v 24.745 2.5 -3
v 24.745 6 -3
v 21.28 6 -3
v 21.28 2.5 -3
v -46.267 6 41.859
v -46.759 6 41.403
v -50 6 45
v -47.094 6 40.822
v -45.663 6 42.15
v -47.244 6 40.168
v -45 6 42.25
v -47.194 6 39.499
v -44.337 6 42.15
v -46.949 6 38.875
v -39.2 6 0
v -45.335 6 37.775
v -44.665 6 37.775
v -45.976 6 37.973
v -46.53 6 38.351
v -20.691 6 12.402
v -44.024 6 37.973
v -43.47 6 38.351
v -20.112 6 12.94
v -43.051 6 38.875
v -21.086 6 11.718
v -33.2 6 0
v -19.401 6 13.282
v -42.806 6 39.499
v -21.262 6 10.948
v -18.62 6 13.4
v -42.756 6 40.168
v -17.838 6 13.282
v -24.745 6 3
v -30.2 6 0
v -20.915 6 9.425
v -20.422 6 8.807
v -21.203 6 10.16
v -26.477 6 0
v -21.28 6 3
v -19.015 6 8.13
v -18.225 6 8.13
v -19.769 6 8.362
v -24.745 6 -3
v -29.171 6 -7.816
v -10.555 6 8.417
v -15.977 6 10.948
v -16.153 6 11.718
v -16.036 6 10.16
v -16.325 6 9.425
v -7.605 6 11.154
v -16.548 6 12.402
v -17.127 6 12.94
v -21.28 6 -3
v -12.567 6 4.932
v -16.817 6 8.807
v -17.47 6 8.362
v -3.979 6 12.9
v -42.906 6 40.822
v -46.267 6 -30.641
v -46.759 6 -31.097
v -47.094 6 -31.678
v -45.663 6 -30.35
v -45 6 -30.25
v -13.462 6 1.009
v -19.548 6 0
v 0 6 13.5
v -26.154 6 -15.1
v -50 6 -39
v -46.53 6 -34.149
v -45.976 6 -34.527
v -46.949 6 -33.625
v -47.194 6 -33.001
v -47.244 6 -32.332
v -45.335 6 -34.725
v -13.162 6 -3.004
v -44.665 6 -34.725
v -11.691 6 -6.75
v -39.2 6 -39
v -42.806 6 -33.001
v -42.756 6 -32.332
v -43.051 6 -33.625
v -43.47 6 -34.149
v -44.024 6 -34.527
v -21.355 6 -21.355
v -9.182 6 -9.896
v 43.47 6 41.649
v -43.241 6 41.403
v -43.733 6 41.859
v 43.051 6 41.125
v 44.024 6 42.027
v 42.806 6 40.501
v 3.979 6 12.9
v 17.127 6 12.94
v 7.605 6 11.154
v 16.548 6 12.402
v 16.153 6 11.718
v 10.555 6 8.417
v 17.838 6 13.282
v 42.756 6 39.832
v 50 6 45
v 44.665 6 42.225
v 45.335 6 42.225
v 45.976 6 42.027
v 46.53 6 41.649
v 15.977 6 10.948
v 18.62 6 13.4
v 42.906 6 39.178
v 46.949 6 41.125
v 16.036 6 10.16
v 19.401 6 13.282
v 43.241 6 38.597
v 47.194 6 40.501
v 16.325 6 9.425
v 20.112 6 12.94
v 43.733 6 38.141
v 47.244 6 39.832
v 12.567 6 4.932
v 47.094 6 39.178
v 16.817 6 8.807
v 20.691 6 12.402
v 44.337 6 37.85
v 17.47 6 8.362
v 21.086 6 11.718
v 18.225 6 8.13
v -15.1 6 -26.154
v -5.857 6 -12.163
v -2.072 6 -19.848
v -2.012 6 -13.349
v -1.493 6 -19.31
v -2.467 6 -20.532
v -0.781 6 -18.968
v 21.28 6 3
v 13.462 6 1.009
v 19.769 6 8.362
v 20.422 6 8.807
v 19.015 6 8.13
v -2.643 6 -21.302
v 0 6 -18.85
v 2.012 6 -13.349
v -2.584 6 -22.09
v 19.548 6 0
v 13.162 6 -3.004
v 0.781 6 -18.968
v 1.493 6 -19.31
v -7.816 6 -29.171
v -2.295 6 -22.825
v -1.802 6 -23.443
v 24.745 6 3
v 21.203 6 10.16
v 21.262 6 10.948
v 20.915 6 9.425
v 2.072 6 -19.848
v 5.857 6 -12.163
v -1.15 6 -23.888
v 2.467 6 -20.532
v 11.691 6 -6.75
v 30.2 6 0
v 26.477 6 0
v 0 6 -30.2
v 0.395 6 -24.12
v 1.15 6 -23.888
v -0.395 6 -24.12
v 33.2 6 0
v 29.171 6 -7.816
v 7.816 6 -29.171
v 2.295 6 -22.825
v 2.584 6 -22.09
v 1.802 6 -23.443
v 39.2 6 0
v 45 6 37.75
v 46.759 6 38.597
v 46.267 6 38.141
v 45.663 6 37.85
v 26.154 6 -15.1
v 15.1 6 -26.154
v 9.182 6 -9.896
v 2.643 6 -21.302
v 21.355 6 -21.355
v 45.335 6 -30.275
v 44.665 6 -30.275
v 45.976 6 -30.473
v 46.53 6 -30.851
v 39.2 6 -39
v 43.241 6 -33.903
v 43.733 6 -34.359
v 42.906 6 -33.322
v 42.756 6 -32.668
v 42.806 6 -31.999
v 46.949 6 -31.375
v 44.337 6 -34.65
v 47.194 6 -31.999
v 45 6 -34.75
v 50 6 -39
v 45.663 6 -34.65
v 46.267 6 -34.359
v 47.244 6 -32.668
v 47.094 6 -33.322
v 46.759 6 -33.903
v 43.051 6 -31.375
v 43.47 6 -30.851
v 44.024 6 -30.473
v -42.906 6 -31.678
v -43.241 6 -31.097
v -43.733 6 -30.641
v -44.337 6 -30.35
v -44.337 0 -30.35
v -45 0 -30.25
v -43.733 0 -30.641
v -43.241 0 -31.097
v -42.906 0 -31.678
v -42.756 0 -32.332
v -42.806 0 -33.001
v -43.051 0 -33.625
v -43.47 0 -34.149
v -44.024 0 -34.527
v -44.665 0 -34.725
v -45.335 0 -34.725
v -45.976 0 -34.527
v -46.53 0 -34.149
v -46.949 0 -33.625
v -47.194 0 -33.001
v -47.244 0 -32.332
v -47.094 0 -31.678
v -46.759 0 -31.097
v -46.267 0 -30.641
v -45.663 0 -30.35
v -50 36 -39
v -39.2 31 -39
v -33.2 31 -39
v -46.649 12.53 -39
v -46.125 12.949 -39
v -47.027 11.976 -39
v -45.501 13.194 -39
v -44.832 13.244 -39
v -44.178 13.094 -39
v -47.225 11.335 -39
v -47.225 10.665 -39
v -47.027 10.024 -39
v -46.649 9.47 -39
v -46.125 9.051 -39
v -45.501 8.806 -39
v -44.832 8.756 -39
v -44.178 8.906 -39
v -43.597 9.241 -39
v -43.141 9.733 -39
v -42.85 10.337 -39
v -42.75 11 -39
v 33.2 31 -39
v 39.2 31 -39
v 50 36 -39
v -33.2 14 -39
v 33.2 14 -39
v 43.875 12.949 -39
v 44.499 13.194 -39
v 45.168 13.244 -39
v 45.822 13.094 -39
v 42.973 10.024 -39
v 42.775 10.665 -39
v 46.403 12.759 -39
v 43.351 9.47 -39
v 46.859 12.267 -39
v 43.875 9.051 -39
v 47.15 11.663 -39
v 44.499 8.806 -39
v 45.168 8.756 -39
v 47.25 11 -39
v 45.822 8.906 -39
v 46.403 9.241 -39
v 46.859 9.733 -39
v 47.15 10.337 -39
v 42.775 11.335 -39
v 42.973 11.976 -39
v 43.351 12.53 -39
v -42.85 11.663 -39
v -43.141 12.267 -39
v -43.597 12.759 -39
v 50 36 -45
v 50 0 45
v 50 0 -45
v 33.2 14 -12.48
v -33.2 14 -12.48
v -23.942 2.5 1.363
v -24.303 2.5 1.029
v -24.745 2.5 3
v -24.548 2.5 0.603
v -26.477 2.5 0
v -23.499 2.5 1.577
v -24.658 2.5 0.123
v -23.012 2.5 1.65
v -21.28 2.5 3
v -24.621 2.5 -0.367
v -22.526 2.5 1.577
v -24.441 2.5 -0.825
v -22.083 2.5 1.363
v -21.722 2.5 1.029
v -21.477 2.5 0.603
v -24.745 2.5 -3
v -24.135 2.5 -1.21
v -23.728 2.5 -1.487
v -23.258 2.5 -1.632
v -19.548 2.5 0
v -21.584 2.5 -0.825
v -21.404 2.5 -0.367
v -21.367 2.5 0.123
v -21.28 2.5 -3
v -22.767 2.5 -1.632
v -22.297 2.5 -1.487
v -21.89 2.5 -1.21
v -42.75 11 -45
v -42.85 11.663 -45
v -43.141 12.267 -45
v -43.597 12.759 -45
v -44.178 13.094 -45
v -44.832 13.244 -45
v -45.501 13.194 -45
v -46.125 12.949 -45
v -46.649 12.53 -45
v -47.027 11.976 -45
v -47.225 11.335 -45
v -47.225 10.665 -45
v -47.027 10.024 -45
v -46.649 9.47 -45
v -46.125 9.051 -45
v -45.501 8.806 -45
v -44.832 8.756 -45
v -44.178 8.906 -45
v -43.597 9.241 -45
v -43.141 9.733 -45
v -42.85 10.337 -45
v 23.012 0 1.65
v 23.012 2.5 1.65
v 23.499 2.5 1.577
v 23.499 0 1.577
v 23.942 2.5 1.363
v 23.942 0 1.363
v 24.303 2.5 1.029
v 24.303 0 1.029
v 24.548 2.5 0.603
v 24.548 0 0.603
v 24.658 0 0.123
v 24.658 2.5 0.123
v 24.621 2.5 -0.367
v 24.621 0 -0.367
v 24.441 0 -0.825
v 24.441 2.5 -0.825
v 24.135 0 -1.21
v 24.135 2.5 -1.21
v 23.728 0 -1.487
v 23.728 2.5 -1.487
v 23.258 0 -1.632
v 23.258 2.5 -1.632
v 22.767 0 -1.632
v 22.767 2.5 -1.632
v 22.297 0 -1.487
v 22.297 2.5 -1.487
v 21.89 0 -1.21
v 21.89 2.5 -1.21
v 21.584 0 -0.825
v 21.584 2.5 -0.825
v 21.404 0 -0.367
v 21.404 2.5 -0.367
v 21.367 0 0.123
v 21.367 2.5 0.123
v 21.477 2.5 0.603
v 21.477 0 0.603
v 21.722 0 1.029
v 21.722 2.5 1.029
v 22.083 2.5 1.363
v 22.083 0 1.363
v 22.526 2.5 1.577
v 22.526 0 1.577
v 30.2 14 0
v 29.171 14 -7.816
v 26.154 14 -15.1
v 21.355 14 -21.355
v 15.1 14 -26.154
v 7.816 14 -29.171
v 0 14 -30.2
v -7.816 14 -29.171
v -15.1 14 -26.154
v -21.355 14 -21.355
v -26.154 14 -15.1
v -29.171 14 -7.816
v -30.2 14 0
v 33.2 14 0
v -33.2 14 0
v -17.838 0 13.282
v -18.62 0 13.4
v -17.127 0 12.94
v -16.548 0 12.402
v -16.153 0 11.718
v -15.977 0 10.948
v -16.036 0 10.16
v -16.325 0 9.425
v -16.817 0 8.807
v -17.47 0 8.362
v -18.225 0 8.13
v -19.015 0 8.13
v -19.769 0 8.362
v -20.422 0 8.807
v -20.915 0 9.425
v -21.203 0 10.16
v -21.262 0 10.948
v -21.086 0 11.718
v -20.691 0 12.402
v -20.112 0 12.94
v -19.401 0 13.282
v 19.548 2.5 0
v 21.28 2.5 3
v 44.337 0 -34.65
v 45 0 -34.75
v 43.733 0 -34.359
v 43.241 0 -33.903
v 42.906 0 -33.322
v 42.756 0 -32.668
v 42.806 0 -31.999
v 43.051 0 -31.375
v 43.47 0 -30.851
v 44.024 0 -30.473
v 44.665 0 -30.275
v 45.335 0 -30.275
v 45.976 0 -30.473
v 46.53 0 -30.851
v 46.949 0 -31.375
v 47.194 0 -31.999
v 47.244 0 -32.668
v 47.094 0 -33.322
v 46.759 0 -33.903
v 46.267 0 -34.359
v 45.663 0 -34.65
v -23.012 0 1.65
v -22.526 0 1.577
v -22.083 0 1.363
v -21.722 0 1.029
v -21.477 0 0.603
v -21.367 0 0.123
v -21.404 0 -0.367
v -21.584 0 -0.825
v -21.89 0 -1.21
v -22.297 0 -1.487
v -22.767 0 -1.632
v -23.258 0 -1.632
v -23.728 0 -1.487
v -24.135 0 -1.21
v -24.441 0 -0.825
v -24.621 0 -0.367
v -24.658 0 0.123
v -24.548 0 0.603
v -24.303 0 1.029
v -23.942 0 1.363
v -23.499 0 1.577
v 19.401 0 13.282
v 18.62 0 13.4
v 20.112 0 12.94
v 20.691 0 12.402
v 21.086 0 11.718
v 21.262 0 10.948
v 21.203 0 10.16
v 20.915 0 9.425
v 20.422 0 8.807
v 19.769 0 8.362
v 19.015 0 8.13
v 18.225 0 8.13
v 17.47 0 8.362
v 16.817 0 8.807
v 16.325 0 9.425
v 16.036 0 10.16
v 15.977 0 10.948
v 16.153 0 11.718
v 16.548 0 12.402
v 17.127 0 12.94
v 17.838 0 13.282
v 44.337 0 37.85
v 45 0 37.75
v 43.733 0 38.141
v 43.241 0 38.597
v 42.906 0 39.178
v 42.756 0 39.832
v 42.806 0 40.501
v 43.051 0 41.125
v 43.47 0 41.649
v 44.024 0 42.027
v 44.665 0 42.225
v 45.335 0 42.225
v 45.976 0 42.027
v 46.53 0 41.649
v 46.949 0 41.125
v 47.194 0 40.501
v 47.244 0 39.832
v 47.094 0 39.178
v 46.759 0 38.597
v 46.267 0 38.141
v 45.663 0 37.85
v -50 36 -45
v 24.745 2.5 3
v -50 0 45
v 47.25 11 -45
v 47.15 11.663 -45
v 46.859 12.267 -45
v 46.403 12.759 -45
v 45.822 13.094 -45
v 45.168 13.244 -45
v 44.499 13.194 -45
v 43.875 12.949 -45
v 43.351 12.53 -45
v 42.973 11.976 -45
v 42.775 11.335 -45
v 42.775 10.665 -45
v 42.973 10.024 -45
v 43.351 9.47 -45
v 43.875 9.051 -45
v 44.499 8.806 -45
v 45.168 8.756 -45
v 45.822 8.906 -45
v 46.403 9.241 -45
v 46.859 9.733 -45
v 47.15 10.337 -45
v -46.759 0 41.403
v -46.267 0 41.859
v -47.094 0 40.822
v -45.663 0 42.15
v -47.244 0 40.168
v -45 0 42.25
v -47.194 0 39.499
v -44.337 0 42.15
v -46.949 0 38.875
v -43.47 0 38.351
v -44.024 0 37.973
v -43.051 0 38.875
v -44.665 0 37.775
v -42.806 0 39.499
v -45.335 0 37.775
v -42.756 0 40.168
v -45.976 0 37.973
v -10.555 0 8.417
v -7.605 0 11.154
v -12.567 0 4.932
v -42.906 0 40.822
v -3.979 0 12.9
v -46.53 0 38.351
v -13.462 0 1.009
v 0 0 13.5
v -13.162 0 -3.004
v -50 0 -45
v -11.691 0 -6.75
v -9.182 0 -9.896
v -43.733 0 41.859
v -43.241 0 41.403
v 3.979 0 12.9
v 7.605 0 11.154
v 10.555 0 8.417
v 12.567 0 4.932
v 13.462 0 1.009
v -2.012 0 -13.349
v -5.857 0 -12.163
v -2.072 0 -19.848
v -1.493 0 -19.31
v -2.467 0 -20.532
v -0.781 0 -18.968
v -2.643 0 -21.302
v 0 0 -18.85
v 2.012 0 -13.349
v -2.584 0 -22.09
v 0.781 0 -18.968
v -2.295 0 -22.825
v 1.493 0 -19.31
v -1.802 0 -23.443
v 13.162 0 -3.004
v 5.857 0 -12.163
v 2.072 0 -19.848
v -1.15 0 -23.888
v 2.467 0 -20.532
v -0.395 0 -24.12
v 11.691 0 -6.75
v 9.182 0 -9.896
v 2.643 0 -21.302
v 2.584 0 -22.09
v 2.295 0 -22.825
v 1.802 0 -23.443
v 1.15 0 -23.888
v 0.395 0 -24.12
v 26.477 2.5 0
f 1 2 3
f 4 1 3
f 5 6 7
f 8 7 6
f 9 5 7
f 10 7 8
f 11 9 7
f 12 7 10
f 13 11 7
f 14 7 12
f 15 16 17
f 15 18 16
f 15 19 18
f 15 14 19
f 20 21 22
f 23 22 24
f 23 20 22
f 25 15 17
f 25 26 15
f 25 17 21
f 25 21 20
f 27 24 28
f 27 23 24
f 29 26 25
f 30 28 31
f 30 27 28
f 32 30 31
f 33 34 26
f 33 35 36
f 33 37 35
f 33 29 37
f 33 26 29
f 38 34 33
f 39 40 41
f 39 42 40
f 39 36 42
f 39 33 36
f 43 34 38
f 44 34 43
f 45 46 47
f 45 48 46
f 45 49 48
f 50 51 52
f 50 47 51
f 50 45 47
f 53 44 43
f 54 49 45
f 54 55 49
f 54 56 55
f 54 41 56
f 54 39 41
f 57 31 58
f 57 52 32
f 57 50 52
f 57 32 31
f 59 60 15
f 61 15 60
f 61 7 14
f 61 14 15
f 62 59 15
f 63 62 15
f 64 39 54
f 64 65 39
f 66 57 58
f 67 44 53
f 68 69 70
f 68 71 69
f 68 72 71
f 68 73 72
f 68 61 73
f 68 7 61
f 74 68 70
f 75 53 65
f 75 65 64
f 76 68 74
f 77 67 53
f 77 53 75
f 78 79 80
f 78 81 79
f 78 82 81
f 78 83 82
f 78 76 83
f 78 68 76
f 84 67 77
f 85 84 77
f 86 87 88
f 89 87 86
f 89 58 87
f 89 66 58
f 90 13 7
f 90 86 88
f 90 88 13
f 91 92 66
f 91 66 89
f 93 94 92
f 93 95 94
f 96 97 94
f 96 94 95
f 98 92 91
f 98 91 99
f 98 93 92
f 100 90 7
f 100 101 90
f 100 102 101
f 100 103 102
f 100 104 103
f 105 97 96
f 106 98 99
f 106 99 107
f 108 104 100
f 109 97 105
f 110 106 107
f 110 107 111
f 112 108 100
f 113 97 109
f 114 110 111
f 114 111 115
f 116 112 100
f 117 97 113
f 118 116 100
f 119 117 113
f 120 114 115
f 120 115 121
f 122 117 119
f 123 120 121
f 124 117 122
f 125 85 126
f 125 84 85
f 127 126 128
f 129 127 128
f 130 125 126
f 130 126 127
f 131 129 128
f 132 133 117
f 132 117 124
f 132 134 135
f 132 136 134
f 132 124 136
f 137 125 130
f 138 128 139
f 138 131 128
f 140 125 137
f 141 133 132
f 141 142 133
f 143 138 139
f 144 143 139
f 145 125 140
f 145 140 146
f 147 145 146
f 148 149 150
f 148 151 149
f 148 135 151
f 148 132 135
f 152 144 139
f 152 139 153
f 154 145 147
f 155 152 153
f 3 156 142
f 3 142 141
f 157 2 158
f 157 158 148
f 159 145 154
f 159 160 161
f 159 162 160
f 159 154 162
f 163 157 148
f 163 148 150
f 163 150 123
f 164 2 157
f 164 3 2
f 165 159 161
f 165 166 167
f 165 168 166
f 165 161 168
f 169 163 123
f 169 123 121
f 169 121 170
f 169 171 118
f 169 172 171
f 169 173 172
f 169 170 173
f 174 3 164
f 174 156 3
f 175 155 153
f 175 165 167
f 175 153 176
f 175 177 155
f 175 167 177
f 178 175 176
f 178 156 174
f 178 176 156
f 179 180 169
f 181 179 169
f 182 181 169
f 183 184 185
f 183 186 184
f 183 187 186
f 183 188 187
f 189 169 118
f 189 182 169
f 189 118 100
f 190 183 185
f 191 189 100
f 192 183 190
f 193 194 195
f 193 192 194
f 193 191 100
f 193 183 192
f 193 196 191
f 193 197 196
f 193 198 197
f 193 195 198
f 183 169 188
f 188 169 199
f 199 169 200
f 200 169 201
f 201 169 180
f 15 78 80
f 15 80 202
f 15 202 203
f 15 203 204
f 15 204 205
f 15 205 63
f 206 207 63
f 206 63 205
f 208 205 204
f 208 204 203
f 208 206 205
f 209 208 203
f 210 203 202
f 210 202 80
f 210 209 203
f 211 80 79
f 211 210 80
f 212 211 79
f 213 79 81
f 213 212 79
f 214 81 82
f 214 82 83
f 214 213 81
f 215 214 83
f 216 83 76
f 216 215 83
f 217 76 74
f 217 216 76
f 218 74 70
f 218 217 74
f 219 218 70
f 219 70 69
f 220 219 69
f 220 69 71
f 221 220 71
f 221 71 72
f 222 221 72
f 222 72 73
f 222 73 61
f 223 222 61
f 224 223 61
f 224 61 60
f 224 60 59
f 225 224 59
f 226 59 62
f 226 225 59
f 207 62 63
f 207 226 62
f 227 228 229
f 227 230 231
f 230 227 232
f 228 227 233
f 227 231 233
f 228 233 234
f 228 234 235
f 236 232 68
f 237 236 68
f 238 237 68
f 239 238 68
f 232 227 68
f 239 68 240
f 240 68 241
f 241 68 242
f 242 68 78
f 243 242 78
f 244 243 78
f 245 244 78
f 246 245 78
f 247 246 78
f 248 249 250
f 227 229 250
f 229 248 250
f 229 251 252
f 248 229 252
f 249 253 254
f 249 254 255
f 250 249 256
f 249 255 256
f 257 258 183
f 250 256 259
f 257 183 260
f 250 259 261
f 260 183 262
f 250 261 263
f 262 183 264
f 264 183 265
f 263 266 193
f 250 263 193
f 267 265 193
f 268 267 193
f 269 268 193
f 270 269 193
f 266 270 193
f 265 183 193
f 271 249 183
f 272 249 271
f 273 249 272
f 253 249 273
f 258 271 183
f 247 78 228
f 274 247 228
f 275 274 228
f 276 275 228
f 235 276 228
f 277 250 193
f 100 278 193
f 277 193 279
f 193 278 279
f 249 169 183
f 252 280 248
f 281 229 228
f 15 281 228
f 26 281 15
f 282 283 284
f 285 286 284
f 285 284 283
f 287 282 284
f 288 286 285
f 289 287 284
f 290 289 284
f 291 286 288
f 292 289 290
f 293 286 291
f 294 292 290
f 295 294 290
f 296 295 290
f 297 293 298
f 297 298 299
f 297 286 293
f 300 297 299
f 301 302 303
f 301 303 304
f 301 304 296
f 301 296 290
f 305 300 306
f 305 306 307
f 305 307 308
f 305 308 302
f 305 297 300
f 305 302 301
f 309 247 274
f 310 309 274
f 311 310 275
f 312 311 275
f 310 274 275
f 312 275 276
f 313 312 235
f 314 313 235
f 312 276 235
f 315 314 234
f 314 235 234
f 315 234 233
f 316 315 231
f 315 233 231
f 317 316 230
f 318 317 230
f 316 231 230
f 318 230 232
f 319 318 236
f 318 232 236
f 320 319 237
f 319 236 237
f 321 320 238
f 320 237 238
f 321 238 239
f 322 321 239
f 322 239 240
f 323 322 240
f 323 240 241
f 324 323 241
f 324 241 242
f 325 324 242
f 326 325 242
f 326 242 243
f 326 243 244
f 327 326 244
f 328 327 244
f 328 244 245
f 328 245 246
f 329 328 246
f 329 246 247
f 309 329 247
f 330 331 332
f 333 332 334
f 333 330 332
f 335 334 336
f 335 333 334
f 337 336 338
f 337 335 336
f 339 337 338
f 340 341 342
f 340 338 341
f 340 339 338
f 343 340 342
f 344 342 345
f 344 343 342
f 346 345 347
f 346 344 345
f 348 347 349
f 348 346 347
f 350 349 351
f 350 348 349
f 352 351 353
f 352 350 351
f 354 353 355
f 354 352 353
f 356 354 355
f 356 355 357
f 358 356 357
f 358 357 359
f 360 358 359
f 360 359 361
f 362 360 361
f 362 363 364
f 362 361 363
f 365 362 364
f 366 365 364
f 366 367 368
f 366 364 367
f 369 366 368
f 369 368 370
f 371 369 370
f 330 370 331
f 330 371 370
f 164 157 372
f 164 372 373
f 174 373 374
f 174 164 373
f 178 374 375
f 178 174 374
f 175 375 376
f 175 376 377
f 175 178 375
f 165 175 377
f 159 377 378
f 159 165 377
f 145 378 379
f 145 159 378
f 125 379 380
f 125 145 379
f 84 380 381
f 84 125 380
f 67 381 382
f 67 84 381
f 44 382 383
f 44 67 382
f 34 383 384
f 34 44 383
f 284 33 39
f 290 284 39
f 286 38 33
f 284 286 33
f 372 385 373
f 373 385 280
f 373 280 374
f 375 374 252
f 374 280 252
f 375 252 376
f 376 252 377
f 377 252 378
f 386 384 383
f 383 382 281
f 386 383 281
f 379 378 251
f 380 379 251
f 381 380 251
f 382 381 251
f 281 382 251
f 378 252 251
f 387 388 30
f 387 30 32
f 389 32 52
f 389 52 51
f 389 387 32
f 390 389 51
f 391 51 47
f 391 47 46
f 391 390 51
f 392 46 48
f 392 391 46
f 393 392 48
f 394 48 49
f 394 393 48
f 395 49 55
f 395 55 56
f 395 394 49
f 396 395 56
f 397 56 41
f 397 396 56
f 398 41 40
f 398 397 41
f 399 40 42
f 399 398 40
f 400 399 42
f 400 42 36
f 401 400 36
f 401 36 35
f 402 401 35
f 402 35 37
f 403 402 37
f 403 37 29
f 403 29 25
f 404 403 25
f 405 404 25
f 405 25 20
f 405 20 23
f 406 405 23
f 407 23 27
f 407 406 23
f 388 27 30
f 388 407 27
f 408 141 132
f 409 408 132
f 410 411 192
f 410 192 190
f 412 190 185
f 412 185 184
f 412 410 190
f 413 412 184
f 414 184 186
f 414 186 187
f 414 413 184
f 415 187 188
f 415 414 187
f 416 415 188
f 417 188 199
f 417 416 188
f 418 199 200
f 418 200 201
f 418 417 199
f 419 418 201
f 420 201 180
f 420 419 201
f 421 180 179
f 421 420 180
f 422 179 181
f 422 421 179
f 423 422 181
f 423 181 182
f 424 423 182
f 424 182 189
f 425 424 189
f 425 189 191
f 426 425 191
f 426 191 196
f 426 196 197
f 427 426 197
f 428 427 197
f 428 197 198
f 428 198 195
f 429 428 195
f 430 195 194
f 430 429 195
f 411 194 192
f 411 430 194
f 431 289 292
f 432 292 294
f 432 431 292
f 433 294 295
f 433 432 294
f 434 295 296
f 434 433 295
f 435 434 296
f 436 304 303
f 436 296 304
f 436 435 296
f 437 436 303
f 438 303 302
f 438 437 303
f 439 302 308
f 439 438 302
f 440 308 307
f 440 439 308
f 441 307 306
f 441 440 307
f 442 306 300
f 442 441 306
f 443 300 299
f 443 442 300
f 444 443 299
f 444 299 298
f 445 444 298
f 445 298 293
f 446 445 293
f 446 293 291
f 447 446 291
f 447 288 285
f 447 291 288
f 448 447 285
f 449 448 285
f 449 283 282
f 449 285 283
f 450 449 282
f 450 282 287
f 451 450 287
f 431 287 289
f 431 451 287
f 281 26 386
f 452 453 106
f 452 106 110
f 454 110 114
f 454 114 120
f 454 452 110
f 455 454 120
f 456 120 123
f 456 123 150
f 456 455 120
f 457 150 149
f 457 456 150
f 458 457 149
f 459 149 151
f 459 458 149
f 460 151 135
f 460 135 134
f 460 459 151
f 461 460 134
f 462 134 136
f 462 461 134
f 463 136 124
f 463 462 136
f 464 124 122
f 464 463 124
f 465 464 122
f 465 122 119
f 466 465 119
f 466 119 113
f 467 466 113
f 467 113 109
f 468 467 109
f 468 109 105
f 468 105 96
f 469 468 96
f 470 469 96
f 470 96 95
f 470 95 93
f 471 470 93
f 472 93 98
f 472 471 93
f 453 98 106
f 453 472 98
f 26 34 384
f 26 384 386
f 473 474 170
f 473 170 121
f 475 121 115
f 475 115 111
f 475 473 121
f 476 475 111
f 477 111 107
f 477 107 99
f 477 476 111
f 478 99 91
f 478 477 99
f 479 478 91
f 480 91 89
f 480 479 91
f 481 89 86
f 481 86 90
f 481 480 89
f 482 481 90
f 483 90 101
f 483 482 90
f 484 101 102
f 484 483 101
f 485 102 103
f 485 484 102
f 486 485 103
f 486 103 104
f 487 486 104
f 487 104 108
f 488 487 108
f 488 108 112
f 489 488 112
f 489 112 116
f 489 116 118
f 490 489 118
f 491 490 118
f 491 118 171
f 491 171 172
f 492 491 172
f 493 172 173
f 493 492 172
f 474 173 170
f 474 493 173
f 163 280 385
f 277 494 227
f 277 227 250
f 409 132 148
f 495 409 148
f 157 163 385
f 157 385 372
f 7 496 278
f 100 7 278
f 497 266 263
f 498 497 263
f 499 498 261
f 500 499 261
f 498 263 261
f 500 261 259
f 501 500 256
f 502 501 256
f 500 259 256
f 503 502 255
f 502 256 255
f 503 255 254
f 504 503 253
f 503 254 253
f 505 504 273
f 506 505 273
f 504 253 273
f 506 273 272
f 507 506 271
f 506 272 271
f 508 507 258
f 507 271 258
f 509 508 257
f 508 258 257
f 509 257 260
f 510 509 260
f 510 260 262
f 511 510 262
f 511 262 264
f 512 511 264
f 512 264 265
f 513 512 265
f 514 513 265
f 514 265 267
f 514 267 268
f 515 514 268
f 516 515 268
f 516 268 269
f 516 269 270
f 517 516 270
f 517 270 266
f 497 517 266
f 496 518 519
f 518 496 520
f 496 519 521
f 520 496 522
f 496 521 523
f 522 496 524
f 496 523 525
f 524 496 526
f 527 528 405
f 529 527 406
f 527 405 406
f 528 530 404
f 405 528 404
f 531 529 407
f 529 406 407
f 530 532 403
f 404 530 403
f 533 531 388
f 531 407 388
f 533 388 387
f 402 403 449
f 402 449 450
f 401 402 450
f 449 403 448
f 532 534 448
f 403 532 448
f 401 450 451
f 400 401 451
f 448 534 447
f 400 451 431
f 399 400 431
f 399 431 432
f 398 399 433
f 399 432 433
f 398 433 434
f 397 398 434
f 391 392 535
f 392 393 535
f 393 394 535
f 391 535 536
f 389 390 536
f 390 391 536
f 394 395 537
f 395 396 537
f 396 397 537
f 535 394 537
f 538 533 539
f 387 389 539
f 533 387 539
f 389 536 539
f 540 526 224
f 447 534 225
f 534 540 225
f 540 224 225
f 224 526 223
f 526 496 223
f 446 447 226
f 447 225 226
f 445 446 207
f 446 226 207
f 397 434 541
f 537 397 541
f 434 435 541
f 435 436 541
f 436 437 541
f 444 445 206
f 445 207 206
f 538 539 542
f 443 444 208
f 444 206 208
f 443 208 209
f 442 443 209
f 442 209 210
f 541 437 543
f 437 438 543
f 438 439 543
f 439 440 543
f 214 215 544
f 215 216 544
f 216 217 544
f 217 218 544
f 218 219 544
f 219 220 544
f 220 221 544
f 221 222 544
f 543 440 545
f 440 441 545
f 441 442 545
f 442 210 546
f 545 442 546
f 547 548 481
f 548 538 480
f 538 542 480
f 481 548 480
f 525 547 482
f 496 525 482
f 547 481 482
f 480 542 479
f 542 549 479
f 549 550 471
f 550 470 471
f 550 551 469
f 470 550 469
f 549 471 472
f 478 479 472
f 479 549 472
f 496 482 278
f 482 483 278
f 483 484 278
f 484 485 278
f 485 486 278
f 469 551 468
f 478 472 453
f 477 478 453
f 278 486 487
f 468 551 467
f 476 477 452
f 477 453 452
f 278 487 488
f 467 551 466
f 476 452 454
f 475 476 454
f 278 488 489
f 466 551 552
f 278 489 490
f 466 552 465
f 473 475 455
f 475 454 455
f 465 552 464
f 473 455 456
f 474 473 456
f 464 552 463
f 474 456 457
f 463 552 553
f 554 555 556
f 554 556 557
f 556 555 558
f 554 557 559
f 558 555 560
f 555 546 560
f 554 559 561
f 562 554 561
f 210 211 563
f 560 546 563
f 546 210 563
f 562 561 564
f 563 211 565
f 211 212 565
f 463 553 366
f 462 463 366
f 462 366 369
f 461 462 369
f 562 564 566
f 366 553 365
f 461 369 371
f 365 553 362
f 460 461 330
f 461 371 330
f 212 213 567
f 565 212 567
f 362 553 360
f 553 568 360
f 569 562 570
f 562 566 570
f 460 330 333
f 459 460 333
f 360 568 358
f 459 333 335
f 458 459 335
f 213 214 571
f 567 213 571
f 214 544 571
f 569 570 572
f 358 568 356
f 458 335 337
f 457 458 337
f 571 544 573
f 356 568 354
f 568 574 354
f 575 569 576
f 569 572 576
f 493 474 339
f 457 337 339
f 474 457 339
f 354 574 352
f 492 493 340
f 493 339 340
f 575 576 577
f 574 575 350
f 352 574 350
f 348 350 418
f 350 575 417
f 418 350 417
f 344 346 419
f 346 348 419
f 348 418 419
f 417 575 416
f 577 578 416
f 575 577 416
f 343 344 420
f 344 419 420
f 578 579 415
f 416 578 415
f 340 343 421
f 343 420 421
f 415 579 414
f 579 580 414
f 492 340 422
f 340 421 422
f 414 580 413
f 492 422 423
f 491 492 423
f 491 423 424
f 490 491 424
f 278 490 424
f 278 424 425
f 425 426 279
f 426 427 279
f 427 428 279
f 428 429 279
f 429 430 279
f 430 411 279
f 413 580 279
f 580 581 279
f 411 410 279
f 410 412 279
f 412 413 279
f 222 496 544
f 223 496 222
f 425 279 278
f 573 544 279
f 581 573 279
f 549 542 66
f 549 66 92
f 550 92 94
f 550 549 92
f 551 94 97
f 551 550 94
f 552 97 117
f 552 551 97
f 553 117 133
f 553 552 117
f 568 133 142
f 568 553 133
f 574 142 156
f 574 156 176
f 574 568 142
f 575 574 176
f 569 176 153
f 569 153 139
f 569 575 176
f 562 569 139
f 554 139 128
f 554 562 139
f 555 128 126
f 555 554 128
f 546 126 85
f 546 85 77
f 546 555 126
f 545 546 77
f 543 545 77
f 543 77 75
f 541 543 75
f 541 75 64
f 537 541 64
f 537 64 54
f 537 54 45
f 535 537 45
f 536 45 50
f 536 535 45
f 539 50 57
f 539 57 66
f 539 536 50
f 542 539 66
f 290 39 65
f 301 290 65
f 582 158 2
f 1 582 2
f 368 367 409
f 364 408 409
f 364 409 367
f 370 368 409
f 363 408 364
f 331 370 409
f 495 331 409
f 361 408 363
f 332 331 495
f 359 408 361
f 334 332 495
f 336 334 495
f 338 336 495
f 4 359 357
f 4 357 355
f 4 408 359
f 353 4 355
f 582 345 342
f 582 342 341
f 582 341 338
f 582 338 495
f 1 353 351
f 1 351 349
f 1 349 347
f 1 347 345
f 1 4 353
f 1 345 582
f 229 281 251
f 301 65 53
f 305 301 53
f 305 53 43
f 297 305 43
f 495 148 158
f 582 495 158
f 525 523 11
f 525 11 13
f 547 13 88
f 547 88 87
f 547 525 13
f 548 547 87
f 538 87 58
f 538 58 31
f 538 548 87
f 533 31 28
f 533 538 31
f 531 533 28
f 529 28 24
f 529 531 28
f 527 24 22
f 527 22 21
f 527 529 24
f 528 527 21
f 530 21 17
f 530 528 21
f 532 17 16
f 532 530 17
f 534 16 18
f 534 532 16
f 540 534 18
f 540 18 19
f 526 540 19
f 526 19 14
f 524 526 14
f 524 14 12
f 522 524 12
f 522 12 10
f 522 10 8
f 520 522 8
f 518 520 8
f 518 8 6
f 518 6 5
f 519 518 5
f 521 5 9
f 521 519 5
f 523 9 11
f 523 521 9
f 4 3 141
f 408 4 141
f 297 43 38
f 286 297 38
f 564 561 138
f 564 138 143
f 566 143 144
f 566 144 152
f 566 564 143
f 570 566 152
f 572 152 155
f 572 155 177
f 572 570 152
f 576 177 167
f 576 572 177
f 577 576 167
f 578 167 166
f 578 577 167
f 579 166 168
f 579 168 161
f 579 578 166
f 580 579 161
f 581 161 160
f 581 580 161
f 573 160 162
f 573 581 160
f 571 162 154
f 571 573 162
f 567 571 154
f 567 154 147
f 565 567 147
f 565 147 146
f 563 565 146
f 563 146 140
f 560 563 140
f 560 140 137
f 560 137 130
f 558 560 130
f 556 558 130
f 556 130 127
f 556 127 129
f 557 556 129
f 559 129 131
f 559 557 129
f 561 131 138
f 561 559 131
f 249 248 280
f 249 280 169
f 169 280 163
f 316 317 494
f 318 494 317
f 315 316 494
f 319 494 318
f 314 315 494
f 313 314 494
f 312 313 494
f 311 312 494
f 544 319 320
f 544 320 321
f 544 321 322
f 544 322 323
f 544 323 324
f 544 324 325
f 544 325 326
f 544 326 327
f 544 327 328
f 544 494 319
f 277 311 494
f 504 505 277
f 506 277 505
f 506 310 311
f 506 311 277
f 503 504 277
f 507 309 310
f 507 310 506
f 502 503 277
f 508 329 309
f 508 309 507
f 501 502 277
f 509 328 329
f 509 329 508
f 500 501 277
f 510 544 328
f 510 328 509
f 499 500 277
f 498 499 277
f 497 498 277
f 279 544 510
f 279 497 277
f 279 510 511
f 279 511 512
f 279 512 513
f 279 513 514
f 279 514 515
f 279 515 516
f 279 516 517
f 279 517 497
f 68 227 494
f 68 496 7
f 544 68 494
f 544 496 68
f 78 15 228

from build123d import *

# Parameters (mm, degrees)
SKETCH1_W           = 100
SKETCH1_H           = 90
SKETCH1_R           = 13.5
SKETCH1_R_2         = 2.65
SKETCH1_R_3         = 1.65
SKETCH1_R_4         = 2.25
BOSS_EXTRUDE1_DEPTH = 6
BOSS_EXTRUDE2_DEPTH = 8
SKETCH3_W           = 100
SKETCH3_H           = 6
BOSS_EXTRUDE3_DEPTH = 30
CUT_EXTRUDE1_REACH  = 106.173
SKETCH7_R           = 2.25
CUT_EXTRUDE2_DEPTH  = 3.5
BOSS_EXTRUDE4_DEPTH = 6


with BuildPart() as part:
    # Sketch1 → Boss-Extrude1 (new body)
    with BuildSketch(Plane(origin=(0, 0, 0), x_dir=(1, 0, 0), z_dir=(0, 1, 0))):
        Rectangle(SKETCH1_W, SKETCH1_H)
        with Locations(Location((0, 0, 0), (0, 0, 270))):
            Circle(SKETCH1_R, mode=Mode.SUBTRACT)
        with Locations(Location((0, 21.5, 0), (0, 0, 270))):
            Circle(SKETCH1_R_2, mode=Mode.SUBTRACT)
        with Locations(Location((23.0125, 0, 0), (0, 0, 270))):
            Circle(SKETCH1_R_3, mode=Mode.SUBTRACT)
        with Locations(Location((-23.0125, 0, 0), (0, 0, 270))):
            Circle(SKETCH1_R_3, mode=Mode.SUBTRACT)
        with Locations(Location((18.619546181, -10.75, 0), (0, 0, 270))):
            Circle(SKETCH1_R_2, mode=Mode.SUBTRACT)
        with Locations(Location((-18.619546181, -10.75, 0), (0, 0, 270))):
            Circle(SKETCH1_R_2, mode=Mode.SUBTRACT)
        with Locations(Location((-45, -40, 0), (0, 0, 270))):
            Circle(SKETCH1_R_4, mode=Mode.SUBTRACT)
        with Locations(Location((-45, 32.5, 0), (0, 0, 270))):
            Circle(SKETCH1_R_4, mode=Mode.SUBTRACT)
        with Locations(Location((45, 32.5, 0), (0, 0, 90))):
            Circle(SKETCH1_R_4, mode=Mode.SUBTRACT)
        with Locations(Location((45, -40, 0), (0, 0, 90))):
            Circle(SKETCH1_R_4, mode=Mode.SUBTRACT)
    extrude(amount=BOSS_EXTRUDE1_DEPTH)

    # Sketch2 → Boss-Extrude2 (add)
    with BuildSketch(Plane(origin=(0, 6, 0), x_dir=(1, 0, 0), z_dir=(0, 1, 0))):
        with BuildLine():
            Line((-30.2, 0), (-33.2, 0))
            Line((-33.2, 0), (-33.2, 39))
            Line((-33.2, 39), (33.2, 39))
            Line((33.2, 39), (33.2, 0))
            Line((33.2, 0), (30.2, 0))
            ThreePointArc((30.2, 0), (0, 30.2), (-30.2, 0))
        make_face()
    extrude(amount=BOSS_EXTRUDE2_DEPTH)

    # Sketch3 → Boss-Extrude3 (add)
    with BuildSketch(Plane(origin=(0, 6, 0), x_dir=(1, 0, 0), z_dir=(0, 1, 0))):
        with Locations((0, 42)):
            Rectangle(SKETCH3_W, SKETCH3_H)
    extrude(amount=BOSS_EXTRUDE3_DEPTH)

    # Sketch7 → Cut-Extrude1 (cut, up to next)
    with BuildSketch(Plane.XY.offset(-39), mode=Mode.PRIVATE) as cut_extrude1_sk1:
        with Locations((-45, 11)):
            Circle(SKETCH7_R)
    cut_extrude1_tool1 = extrude(cut_extrude1_sk1.sketch, amount=-CUT_EXTRUDE1_REACH, mode=Mode.PRIVATE) & part.part
    # Sketch7 → Cut-Extrude1 (cut, up to next)
    with BuildSketch(Plane.XY.offset(-39), mode=Mode.PRIVATE) as cut_extrude1_sk2:
        with Locations((45, 11)):
            Circle(SKETCH7_R)
    cut_extrude1_tool2 = extrude(cut_extrude1_sk2.sketch, amount=-CUT_EXTRUDE1_REACH, mode=Mode.PRIVATE) & part.part
    add(cut_extrude1_tool1.solids().sort_by_distance((-45, 11, -39))[0], mode=Mode.SUBTRACT)
    add(cut_extrude1_tool2.solids().sort_by_distance((45, 11, -39))[0], mode=Mode.SUBTRACT)

    # Sketch8 → Cut-Extrude2 (cut)
    with BuildSketch(Plane(origin=(0, 6, 0), x_dir=(1, 0, 0), z_dir=(0, 1, 0))):
        Polygon((19.548398385, 0), (21.280449192, -3), (24.744550808, -3), (26.476601615, 0), (24.744550808, 3), (21.280449192, 3), align=None)
        Polygon((-19.548398385, 0), (-21.280449192, 3), (-24.744550808, 3), (-26.476601615, 0), (-24.744550808, -3), (-21.280449192, -3), align=None)
    extrude(amount=-CUT_EXTRUDE2_DEPTH, mode=Mode.SUBTRACT)

    # Sketch9 → Boss-Extrude4 (add)
    with BuildSketch(Plane.ZY.offset(33.2)):
        Polygon((-39, 6), (-39, 31), (0, 6), align=None)
    boss_extrude4 = extrude(amount=BOSS_EXTRUDE4_DEPTH)

    # Mirror1: Boss-Extrude4 across plane
    add(boss_extrude4.mirror(Plane(origin=(0, 0, 0), x_dir=(0, 0, 1), z_dir=(1, 0, 0))))


solid = part.part
